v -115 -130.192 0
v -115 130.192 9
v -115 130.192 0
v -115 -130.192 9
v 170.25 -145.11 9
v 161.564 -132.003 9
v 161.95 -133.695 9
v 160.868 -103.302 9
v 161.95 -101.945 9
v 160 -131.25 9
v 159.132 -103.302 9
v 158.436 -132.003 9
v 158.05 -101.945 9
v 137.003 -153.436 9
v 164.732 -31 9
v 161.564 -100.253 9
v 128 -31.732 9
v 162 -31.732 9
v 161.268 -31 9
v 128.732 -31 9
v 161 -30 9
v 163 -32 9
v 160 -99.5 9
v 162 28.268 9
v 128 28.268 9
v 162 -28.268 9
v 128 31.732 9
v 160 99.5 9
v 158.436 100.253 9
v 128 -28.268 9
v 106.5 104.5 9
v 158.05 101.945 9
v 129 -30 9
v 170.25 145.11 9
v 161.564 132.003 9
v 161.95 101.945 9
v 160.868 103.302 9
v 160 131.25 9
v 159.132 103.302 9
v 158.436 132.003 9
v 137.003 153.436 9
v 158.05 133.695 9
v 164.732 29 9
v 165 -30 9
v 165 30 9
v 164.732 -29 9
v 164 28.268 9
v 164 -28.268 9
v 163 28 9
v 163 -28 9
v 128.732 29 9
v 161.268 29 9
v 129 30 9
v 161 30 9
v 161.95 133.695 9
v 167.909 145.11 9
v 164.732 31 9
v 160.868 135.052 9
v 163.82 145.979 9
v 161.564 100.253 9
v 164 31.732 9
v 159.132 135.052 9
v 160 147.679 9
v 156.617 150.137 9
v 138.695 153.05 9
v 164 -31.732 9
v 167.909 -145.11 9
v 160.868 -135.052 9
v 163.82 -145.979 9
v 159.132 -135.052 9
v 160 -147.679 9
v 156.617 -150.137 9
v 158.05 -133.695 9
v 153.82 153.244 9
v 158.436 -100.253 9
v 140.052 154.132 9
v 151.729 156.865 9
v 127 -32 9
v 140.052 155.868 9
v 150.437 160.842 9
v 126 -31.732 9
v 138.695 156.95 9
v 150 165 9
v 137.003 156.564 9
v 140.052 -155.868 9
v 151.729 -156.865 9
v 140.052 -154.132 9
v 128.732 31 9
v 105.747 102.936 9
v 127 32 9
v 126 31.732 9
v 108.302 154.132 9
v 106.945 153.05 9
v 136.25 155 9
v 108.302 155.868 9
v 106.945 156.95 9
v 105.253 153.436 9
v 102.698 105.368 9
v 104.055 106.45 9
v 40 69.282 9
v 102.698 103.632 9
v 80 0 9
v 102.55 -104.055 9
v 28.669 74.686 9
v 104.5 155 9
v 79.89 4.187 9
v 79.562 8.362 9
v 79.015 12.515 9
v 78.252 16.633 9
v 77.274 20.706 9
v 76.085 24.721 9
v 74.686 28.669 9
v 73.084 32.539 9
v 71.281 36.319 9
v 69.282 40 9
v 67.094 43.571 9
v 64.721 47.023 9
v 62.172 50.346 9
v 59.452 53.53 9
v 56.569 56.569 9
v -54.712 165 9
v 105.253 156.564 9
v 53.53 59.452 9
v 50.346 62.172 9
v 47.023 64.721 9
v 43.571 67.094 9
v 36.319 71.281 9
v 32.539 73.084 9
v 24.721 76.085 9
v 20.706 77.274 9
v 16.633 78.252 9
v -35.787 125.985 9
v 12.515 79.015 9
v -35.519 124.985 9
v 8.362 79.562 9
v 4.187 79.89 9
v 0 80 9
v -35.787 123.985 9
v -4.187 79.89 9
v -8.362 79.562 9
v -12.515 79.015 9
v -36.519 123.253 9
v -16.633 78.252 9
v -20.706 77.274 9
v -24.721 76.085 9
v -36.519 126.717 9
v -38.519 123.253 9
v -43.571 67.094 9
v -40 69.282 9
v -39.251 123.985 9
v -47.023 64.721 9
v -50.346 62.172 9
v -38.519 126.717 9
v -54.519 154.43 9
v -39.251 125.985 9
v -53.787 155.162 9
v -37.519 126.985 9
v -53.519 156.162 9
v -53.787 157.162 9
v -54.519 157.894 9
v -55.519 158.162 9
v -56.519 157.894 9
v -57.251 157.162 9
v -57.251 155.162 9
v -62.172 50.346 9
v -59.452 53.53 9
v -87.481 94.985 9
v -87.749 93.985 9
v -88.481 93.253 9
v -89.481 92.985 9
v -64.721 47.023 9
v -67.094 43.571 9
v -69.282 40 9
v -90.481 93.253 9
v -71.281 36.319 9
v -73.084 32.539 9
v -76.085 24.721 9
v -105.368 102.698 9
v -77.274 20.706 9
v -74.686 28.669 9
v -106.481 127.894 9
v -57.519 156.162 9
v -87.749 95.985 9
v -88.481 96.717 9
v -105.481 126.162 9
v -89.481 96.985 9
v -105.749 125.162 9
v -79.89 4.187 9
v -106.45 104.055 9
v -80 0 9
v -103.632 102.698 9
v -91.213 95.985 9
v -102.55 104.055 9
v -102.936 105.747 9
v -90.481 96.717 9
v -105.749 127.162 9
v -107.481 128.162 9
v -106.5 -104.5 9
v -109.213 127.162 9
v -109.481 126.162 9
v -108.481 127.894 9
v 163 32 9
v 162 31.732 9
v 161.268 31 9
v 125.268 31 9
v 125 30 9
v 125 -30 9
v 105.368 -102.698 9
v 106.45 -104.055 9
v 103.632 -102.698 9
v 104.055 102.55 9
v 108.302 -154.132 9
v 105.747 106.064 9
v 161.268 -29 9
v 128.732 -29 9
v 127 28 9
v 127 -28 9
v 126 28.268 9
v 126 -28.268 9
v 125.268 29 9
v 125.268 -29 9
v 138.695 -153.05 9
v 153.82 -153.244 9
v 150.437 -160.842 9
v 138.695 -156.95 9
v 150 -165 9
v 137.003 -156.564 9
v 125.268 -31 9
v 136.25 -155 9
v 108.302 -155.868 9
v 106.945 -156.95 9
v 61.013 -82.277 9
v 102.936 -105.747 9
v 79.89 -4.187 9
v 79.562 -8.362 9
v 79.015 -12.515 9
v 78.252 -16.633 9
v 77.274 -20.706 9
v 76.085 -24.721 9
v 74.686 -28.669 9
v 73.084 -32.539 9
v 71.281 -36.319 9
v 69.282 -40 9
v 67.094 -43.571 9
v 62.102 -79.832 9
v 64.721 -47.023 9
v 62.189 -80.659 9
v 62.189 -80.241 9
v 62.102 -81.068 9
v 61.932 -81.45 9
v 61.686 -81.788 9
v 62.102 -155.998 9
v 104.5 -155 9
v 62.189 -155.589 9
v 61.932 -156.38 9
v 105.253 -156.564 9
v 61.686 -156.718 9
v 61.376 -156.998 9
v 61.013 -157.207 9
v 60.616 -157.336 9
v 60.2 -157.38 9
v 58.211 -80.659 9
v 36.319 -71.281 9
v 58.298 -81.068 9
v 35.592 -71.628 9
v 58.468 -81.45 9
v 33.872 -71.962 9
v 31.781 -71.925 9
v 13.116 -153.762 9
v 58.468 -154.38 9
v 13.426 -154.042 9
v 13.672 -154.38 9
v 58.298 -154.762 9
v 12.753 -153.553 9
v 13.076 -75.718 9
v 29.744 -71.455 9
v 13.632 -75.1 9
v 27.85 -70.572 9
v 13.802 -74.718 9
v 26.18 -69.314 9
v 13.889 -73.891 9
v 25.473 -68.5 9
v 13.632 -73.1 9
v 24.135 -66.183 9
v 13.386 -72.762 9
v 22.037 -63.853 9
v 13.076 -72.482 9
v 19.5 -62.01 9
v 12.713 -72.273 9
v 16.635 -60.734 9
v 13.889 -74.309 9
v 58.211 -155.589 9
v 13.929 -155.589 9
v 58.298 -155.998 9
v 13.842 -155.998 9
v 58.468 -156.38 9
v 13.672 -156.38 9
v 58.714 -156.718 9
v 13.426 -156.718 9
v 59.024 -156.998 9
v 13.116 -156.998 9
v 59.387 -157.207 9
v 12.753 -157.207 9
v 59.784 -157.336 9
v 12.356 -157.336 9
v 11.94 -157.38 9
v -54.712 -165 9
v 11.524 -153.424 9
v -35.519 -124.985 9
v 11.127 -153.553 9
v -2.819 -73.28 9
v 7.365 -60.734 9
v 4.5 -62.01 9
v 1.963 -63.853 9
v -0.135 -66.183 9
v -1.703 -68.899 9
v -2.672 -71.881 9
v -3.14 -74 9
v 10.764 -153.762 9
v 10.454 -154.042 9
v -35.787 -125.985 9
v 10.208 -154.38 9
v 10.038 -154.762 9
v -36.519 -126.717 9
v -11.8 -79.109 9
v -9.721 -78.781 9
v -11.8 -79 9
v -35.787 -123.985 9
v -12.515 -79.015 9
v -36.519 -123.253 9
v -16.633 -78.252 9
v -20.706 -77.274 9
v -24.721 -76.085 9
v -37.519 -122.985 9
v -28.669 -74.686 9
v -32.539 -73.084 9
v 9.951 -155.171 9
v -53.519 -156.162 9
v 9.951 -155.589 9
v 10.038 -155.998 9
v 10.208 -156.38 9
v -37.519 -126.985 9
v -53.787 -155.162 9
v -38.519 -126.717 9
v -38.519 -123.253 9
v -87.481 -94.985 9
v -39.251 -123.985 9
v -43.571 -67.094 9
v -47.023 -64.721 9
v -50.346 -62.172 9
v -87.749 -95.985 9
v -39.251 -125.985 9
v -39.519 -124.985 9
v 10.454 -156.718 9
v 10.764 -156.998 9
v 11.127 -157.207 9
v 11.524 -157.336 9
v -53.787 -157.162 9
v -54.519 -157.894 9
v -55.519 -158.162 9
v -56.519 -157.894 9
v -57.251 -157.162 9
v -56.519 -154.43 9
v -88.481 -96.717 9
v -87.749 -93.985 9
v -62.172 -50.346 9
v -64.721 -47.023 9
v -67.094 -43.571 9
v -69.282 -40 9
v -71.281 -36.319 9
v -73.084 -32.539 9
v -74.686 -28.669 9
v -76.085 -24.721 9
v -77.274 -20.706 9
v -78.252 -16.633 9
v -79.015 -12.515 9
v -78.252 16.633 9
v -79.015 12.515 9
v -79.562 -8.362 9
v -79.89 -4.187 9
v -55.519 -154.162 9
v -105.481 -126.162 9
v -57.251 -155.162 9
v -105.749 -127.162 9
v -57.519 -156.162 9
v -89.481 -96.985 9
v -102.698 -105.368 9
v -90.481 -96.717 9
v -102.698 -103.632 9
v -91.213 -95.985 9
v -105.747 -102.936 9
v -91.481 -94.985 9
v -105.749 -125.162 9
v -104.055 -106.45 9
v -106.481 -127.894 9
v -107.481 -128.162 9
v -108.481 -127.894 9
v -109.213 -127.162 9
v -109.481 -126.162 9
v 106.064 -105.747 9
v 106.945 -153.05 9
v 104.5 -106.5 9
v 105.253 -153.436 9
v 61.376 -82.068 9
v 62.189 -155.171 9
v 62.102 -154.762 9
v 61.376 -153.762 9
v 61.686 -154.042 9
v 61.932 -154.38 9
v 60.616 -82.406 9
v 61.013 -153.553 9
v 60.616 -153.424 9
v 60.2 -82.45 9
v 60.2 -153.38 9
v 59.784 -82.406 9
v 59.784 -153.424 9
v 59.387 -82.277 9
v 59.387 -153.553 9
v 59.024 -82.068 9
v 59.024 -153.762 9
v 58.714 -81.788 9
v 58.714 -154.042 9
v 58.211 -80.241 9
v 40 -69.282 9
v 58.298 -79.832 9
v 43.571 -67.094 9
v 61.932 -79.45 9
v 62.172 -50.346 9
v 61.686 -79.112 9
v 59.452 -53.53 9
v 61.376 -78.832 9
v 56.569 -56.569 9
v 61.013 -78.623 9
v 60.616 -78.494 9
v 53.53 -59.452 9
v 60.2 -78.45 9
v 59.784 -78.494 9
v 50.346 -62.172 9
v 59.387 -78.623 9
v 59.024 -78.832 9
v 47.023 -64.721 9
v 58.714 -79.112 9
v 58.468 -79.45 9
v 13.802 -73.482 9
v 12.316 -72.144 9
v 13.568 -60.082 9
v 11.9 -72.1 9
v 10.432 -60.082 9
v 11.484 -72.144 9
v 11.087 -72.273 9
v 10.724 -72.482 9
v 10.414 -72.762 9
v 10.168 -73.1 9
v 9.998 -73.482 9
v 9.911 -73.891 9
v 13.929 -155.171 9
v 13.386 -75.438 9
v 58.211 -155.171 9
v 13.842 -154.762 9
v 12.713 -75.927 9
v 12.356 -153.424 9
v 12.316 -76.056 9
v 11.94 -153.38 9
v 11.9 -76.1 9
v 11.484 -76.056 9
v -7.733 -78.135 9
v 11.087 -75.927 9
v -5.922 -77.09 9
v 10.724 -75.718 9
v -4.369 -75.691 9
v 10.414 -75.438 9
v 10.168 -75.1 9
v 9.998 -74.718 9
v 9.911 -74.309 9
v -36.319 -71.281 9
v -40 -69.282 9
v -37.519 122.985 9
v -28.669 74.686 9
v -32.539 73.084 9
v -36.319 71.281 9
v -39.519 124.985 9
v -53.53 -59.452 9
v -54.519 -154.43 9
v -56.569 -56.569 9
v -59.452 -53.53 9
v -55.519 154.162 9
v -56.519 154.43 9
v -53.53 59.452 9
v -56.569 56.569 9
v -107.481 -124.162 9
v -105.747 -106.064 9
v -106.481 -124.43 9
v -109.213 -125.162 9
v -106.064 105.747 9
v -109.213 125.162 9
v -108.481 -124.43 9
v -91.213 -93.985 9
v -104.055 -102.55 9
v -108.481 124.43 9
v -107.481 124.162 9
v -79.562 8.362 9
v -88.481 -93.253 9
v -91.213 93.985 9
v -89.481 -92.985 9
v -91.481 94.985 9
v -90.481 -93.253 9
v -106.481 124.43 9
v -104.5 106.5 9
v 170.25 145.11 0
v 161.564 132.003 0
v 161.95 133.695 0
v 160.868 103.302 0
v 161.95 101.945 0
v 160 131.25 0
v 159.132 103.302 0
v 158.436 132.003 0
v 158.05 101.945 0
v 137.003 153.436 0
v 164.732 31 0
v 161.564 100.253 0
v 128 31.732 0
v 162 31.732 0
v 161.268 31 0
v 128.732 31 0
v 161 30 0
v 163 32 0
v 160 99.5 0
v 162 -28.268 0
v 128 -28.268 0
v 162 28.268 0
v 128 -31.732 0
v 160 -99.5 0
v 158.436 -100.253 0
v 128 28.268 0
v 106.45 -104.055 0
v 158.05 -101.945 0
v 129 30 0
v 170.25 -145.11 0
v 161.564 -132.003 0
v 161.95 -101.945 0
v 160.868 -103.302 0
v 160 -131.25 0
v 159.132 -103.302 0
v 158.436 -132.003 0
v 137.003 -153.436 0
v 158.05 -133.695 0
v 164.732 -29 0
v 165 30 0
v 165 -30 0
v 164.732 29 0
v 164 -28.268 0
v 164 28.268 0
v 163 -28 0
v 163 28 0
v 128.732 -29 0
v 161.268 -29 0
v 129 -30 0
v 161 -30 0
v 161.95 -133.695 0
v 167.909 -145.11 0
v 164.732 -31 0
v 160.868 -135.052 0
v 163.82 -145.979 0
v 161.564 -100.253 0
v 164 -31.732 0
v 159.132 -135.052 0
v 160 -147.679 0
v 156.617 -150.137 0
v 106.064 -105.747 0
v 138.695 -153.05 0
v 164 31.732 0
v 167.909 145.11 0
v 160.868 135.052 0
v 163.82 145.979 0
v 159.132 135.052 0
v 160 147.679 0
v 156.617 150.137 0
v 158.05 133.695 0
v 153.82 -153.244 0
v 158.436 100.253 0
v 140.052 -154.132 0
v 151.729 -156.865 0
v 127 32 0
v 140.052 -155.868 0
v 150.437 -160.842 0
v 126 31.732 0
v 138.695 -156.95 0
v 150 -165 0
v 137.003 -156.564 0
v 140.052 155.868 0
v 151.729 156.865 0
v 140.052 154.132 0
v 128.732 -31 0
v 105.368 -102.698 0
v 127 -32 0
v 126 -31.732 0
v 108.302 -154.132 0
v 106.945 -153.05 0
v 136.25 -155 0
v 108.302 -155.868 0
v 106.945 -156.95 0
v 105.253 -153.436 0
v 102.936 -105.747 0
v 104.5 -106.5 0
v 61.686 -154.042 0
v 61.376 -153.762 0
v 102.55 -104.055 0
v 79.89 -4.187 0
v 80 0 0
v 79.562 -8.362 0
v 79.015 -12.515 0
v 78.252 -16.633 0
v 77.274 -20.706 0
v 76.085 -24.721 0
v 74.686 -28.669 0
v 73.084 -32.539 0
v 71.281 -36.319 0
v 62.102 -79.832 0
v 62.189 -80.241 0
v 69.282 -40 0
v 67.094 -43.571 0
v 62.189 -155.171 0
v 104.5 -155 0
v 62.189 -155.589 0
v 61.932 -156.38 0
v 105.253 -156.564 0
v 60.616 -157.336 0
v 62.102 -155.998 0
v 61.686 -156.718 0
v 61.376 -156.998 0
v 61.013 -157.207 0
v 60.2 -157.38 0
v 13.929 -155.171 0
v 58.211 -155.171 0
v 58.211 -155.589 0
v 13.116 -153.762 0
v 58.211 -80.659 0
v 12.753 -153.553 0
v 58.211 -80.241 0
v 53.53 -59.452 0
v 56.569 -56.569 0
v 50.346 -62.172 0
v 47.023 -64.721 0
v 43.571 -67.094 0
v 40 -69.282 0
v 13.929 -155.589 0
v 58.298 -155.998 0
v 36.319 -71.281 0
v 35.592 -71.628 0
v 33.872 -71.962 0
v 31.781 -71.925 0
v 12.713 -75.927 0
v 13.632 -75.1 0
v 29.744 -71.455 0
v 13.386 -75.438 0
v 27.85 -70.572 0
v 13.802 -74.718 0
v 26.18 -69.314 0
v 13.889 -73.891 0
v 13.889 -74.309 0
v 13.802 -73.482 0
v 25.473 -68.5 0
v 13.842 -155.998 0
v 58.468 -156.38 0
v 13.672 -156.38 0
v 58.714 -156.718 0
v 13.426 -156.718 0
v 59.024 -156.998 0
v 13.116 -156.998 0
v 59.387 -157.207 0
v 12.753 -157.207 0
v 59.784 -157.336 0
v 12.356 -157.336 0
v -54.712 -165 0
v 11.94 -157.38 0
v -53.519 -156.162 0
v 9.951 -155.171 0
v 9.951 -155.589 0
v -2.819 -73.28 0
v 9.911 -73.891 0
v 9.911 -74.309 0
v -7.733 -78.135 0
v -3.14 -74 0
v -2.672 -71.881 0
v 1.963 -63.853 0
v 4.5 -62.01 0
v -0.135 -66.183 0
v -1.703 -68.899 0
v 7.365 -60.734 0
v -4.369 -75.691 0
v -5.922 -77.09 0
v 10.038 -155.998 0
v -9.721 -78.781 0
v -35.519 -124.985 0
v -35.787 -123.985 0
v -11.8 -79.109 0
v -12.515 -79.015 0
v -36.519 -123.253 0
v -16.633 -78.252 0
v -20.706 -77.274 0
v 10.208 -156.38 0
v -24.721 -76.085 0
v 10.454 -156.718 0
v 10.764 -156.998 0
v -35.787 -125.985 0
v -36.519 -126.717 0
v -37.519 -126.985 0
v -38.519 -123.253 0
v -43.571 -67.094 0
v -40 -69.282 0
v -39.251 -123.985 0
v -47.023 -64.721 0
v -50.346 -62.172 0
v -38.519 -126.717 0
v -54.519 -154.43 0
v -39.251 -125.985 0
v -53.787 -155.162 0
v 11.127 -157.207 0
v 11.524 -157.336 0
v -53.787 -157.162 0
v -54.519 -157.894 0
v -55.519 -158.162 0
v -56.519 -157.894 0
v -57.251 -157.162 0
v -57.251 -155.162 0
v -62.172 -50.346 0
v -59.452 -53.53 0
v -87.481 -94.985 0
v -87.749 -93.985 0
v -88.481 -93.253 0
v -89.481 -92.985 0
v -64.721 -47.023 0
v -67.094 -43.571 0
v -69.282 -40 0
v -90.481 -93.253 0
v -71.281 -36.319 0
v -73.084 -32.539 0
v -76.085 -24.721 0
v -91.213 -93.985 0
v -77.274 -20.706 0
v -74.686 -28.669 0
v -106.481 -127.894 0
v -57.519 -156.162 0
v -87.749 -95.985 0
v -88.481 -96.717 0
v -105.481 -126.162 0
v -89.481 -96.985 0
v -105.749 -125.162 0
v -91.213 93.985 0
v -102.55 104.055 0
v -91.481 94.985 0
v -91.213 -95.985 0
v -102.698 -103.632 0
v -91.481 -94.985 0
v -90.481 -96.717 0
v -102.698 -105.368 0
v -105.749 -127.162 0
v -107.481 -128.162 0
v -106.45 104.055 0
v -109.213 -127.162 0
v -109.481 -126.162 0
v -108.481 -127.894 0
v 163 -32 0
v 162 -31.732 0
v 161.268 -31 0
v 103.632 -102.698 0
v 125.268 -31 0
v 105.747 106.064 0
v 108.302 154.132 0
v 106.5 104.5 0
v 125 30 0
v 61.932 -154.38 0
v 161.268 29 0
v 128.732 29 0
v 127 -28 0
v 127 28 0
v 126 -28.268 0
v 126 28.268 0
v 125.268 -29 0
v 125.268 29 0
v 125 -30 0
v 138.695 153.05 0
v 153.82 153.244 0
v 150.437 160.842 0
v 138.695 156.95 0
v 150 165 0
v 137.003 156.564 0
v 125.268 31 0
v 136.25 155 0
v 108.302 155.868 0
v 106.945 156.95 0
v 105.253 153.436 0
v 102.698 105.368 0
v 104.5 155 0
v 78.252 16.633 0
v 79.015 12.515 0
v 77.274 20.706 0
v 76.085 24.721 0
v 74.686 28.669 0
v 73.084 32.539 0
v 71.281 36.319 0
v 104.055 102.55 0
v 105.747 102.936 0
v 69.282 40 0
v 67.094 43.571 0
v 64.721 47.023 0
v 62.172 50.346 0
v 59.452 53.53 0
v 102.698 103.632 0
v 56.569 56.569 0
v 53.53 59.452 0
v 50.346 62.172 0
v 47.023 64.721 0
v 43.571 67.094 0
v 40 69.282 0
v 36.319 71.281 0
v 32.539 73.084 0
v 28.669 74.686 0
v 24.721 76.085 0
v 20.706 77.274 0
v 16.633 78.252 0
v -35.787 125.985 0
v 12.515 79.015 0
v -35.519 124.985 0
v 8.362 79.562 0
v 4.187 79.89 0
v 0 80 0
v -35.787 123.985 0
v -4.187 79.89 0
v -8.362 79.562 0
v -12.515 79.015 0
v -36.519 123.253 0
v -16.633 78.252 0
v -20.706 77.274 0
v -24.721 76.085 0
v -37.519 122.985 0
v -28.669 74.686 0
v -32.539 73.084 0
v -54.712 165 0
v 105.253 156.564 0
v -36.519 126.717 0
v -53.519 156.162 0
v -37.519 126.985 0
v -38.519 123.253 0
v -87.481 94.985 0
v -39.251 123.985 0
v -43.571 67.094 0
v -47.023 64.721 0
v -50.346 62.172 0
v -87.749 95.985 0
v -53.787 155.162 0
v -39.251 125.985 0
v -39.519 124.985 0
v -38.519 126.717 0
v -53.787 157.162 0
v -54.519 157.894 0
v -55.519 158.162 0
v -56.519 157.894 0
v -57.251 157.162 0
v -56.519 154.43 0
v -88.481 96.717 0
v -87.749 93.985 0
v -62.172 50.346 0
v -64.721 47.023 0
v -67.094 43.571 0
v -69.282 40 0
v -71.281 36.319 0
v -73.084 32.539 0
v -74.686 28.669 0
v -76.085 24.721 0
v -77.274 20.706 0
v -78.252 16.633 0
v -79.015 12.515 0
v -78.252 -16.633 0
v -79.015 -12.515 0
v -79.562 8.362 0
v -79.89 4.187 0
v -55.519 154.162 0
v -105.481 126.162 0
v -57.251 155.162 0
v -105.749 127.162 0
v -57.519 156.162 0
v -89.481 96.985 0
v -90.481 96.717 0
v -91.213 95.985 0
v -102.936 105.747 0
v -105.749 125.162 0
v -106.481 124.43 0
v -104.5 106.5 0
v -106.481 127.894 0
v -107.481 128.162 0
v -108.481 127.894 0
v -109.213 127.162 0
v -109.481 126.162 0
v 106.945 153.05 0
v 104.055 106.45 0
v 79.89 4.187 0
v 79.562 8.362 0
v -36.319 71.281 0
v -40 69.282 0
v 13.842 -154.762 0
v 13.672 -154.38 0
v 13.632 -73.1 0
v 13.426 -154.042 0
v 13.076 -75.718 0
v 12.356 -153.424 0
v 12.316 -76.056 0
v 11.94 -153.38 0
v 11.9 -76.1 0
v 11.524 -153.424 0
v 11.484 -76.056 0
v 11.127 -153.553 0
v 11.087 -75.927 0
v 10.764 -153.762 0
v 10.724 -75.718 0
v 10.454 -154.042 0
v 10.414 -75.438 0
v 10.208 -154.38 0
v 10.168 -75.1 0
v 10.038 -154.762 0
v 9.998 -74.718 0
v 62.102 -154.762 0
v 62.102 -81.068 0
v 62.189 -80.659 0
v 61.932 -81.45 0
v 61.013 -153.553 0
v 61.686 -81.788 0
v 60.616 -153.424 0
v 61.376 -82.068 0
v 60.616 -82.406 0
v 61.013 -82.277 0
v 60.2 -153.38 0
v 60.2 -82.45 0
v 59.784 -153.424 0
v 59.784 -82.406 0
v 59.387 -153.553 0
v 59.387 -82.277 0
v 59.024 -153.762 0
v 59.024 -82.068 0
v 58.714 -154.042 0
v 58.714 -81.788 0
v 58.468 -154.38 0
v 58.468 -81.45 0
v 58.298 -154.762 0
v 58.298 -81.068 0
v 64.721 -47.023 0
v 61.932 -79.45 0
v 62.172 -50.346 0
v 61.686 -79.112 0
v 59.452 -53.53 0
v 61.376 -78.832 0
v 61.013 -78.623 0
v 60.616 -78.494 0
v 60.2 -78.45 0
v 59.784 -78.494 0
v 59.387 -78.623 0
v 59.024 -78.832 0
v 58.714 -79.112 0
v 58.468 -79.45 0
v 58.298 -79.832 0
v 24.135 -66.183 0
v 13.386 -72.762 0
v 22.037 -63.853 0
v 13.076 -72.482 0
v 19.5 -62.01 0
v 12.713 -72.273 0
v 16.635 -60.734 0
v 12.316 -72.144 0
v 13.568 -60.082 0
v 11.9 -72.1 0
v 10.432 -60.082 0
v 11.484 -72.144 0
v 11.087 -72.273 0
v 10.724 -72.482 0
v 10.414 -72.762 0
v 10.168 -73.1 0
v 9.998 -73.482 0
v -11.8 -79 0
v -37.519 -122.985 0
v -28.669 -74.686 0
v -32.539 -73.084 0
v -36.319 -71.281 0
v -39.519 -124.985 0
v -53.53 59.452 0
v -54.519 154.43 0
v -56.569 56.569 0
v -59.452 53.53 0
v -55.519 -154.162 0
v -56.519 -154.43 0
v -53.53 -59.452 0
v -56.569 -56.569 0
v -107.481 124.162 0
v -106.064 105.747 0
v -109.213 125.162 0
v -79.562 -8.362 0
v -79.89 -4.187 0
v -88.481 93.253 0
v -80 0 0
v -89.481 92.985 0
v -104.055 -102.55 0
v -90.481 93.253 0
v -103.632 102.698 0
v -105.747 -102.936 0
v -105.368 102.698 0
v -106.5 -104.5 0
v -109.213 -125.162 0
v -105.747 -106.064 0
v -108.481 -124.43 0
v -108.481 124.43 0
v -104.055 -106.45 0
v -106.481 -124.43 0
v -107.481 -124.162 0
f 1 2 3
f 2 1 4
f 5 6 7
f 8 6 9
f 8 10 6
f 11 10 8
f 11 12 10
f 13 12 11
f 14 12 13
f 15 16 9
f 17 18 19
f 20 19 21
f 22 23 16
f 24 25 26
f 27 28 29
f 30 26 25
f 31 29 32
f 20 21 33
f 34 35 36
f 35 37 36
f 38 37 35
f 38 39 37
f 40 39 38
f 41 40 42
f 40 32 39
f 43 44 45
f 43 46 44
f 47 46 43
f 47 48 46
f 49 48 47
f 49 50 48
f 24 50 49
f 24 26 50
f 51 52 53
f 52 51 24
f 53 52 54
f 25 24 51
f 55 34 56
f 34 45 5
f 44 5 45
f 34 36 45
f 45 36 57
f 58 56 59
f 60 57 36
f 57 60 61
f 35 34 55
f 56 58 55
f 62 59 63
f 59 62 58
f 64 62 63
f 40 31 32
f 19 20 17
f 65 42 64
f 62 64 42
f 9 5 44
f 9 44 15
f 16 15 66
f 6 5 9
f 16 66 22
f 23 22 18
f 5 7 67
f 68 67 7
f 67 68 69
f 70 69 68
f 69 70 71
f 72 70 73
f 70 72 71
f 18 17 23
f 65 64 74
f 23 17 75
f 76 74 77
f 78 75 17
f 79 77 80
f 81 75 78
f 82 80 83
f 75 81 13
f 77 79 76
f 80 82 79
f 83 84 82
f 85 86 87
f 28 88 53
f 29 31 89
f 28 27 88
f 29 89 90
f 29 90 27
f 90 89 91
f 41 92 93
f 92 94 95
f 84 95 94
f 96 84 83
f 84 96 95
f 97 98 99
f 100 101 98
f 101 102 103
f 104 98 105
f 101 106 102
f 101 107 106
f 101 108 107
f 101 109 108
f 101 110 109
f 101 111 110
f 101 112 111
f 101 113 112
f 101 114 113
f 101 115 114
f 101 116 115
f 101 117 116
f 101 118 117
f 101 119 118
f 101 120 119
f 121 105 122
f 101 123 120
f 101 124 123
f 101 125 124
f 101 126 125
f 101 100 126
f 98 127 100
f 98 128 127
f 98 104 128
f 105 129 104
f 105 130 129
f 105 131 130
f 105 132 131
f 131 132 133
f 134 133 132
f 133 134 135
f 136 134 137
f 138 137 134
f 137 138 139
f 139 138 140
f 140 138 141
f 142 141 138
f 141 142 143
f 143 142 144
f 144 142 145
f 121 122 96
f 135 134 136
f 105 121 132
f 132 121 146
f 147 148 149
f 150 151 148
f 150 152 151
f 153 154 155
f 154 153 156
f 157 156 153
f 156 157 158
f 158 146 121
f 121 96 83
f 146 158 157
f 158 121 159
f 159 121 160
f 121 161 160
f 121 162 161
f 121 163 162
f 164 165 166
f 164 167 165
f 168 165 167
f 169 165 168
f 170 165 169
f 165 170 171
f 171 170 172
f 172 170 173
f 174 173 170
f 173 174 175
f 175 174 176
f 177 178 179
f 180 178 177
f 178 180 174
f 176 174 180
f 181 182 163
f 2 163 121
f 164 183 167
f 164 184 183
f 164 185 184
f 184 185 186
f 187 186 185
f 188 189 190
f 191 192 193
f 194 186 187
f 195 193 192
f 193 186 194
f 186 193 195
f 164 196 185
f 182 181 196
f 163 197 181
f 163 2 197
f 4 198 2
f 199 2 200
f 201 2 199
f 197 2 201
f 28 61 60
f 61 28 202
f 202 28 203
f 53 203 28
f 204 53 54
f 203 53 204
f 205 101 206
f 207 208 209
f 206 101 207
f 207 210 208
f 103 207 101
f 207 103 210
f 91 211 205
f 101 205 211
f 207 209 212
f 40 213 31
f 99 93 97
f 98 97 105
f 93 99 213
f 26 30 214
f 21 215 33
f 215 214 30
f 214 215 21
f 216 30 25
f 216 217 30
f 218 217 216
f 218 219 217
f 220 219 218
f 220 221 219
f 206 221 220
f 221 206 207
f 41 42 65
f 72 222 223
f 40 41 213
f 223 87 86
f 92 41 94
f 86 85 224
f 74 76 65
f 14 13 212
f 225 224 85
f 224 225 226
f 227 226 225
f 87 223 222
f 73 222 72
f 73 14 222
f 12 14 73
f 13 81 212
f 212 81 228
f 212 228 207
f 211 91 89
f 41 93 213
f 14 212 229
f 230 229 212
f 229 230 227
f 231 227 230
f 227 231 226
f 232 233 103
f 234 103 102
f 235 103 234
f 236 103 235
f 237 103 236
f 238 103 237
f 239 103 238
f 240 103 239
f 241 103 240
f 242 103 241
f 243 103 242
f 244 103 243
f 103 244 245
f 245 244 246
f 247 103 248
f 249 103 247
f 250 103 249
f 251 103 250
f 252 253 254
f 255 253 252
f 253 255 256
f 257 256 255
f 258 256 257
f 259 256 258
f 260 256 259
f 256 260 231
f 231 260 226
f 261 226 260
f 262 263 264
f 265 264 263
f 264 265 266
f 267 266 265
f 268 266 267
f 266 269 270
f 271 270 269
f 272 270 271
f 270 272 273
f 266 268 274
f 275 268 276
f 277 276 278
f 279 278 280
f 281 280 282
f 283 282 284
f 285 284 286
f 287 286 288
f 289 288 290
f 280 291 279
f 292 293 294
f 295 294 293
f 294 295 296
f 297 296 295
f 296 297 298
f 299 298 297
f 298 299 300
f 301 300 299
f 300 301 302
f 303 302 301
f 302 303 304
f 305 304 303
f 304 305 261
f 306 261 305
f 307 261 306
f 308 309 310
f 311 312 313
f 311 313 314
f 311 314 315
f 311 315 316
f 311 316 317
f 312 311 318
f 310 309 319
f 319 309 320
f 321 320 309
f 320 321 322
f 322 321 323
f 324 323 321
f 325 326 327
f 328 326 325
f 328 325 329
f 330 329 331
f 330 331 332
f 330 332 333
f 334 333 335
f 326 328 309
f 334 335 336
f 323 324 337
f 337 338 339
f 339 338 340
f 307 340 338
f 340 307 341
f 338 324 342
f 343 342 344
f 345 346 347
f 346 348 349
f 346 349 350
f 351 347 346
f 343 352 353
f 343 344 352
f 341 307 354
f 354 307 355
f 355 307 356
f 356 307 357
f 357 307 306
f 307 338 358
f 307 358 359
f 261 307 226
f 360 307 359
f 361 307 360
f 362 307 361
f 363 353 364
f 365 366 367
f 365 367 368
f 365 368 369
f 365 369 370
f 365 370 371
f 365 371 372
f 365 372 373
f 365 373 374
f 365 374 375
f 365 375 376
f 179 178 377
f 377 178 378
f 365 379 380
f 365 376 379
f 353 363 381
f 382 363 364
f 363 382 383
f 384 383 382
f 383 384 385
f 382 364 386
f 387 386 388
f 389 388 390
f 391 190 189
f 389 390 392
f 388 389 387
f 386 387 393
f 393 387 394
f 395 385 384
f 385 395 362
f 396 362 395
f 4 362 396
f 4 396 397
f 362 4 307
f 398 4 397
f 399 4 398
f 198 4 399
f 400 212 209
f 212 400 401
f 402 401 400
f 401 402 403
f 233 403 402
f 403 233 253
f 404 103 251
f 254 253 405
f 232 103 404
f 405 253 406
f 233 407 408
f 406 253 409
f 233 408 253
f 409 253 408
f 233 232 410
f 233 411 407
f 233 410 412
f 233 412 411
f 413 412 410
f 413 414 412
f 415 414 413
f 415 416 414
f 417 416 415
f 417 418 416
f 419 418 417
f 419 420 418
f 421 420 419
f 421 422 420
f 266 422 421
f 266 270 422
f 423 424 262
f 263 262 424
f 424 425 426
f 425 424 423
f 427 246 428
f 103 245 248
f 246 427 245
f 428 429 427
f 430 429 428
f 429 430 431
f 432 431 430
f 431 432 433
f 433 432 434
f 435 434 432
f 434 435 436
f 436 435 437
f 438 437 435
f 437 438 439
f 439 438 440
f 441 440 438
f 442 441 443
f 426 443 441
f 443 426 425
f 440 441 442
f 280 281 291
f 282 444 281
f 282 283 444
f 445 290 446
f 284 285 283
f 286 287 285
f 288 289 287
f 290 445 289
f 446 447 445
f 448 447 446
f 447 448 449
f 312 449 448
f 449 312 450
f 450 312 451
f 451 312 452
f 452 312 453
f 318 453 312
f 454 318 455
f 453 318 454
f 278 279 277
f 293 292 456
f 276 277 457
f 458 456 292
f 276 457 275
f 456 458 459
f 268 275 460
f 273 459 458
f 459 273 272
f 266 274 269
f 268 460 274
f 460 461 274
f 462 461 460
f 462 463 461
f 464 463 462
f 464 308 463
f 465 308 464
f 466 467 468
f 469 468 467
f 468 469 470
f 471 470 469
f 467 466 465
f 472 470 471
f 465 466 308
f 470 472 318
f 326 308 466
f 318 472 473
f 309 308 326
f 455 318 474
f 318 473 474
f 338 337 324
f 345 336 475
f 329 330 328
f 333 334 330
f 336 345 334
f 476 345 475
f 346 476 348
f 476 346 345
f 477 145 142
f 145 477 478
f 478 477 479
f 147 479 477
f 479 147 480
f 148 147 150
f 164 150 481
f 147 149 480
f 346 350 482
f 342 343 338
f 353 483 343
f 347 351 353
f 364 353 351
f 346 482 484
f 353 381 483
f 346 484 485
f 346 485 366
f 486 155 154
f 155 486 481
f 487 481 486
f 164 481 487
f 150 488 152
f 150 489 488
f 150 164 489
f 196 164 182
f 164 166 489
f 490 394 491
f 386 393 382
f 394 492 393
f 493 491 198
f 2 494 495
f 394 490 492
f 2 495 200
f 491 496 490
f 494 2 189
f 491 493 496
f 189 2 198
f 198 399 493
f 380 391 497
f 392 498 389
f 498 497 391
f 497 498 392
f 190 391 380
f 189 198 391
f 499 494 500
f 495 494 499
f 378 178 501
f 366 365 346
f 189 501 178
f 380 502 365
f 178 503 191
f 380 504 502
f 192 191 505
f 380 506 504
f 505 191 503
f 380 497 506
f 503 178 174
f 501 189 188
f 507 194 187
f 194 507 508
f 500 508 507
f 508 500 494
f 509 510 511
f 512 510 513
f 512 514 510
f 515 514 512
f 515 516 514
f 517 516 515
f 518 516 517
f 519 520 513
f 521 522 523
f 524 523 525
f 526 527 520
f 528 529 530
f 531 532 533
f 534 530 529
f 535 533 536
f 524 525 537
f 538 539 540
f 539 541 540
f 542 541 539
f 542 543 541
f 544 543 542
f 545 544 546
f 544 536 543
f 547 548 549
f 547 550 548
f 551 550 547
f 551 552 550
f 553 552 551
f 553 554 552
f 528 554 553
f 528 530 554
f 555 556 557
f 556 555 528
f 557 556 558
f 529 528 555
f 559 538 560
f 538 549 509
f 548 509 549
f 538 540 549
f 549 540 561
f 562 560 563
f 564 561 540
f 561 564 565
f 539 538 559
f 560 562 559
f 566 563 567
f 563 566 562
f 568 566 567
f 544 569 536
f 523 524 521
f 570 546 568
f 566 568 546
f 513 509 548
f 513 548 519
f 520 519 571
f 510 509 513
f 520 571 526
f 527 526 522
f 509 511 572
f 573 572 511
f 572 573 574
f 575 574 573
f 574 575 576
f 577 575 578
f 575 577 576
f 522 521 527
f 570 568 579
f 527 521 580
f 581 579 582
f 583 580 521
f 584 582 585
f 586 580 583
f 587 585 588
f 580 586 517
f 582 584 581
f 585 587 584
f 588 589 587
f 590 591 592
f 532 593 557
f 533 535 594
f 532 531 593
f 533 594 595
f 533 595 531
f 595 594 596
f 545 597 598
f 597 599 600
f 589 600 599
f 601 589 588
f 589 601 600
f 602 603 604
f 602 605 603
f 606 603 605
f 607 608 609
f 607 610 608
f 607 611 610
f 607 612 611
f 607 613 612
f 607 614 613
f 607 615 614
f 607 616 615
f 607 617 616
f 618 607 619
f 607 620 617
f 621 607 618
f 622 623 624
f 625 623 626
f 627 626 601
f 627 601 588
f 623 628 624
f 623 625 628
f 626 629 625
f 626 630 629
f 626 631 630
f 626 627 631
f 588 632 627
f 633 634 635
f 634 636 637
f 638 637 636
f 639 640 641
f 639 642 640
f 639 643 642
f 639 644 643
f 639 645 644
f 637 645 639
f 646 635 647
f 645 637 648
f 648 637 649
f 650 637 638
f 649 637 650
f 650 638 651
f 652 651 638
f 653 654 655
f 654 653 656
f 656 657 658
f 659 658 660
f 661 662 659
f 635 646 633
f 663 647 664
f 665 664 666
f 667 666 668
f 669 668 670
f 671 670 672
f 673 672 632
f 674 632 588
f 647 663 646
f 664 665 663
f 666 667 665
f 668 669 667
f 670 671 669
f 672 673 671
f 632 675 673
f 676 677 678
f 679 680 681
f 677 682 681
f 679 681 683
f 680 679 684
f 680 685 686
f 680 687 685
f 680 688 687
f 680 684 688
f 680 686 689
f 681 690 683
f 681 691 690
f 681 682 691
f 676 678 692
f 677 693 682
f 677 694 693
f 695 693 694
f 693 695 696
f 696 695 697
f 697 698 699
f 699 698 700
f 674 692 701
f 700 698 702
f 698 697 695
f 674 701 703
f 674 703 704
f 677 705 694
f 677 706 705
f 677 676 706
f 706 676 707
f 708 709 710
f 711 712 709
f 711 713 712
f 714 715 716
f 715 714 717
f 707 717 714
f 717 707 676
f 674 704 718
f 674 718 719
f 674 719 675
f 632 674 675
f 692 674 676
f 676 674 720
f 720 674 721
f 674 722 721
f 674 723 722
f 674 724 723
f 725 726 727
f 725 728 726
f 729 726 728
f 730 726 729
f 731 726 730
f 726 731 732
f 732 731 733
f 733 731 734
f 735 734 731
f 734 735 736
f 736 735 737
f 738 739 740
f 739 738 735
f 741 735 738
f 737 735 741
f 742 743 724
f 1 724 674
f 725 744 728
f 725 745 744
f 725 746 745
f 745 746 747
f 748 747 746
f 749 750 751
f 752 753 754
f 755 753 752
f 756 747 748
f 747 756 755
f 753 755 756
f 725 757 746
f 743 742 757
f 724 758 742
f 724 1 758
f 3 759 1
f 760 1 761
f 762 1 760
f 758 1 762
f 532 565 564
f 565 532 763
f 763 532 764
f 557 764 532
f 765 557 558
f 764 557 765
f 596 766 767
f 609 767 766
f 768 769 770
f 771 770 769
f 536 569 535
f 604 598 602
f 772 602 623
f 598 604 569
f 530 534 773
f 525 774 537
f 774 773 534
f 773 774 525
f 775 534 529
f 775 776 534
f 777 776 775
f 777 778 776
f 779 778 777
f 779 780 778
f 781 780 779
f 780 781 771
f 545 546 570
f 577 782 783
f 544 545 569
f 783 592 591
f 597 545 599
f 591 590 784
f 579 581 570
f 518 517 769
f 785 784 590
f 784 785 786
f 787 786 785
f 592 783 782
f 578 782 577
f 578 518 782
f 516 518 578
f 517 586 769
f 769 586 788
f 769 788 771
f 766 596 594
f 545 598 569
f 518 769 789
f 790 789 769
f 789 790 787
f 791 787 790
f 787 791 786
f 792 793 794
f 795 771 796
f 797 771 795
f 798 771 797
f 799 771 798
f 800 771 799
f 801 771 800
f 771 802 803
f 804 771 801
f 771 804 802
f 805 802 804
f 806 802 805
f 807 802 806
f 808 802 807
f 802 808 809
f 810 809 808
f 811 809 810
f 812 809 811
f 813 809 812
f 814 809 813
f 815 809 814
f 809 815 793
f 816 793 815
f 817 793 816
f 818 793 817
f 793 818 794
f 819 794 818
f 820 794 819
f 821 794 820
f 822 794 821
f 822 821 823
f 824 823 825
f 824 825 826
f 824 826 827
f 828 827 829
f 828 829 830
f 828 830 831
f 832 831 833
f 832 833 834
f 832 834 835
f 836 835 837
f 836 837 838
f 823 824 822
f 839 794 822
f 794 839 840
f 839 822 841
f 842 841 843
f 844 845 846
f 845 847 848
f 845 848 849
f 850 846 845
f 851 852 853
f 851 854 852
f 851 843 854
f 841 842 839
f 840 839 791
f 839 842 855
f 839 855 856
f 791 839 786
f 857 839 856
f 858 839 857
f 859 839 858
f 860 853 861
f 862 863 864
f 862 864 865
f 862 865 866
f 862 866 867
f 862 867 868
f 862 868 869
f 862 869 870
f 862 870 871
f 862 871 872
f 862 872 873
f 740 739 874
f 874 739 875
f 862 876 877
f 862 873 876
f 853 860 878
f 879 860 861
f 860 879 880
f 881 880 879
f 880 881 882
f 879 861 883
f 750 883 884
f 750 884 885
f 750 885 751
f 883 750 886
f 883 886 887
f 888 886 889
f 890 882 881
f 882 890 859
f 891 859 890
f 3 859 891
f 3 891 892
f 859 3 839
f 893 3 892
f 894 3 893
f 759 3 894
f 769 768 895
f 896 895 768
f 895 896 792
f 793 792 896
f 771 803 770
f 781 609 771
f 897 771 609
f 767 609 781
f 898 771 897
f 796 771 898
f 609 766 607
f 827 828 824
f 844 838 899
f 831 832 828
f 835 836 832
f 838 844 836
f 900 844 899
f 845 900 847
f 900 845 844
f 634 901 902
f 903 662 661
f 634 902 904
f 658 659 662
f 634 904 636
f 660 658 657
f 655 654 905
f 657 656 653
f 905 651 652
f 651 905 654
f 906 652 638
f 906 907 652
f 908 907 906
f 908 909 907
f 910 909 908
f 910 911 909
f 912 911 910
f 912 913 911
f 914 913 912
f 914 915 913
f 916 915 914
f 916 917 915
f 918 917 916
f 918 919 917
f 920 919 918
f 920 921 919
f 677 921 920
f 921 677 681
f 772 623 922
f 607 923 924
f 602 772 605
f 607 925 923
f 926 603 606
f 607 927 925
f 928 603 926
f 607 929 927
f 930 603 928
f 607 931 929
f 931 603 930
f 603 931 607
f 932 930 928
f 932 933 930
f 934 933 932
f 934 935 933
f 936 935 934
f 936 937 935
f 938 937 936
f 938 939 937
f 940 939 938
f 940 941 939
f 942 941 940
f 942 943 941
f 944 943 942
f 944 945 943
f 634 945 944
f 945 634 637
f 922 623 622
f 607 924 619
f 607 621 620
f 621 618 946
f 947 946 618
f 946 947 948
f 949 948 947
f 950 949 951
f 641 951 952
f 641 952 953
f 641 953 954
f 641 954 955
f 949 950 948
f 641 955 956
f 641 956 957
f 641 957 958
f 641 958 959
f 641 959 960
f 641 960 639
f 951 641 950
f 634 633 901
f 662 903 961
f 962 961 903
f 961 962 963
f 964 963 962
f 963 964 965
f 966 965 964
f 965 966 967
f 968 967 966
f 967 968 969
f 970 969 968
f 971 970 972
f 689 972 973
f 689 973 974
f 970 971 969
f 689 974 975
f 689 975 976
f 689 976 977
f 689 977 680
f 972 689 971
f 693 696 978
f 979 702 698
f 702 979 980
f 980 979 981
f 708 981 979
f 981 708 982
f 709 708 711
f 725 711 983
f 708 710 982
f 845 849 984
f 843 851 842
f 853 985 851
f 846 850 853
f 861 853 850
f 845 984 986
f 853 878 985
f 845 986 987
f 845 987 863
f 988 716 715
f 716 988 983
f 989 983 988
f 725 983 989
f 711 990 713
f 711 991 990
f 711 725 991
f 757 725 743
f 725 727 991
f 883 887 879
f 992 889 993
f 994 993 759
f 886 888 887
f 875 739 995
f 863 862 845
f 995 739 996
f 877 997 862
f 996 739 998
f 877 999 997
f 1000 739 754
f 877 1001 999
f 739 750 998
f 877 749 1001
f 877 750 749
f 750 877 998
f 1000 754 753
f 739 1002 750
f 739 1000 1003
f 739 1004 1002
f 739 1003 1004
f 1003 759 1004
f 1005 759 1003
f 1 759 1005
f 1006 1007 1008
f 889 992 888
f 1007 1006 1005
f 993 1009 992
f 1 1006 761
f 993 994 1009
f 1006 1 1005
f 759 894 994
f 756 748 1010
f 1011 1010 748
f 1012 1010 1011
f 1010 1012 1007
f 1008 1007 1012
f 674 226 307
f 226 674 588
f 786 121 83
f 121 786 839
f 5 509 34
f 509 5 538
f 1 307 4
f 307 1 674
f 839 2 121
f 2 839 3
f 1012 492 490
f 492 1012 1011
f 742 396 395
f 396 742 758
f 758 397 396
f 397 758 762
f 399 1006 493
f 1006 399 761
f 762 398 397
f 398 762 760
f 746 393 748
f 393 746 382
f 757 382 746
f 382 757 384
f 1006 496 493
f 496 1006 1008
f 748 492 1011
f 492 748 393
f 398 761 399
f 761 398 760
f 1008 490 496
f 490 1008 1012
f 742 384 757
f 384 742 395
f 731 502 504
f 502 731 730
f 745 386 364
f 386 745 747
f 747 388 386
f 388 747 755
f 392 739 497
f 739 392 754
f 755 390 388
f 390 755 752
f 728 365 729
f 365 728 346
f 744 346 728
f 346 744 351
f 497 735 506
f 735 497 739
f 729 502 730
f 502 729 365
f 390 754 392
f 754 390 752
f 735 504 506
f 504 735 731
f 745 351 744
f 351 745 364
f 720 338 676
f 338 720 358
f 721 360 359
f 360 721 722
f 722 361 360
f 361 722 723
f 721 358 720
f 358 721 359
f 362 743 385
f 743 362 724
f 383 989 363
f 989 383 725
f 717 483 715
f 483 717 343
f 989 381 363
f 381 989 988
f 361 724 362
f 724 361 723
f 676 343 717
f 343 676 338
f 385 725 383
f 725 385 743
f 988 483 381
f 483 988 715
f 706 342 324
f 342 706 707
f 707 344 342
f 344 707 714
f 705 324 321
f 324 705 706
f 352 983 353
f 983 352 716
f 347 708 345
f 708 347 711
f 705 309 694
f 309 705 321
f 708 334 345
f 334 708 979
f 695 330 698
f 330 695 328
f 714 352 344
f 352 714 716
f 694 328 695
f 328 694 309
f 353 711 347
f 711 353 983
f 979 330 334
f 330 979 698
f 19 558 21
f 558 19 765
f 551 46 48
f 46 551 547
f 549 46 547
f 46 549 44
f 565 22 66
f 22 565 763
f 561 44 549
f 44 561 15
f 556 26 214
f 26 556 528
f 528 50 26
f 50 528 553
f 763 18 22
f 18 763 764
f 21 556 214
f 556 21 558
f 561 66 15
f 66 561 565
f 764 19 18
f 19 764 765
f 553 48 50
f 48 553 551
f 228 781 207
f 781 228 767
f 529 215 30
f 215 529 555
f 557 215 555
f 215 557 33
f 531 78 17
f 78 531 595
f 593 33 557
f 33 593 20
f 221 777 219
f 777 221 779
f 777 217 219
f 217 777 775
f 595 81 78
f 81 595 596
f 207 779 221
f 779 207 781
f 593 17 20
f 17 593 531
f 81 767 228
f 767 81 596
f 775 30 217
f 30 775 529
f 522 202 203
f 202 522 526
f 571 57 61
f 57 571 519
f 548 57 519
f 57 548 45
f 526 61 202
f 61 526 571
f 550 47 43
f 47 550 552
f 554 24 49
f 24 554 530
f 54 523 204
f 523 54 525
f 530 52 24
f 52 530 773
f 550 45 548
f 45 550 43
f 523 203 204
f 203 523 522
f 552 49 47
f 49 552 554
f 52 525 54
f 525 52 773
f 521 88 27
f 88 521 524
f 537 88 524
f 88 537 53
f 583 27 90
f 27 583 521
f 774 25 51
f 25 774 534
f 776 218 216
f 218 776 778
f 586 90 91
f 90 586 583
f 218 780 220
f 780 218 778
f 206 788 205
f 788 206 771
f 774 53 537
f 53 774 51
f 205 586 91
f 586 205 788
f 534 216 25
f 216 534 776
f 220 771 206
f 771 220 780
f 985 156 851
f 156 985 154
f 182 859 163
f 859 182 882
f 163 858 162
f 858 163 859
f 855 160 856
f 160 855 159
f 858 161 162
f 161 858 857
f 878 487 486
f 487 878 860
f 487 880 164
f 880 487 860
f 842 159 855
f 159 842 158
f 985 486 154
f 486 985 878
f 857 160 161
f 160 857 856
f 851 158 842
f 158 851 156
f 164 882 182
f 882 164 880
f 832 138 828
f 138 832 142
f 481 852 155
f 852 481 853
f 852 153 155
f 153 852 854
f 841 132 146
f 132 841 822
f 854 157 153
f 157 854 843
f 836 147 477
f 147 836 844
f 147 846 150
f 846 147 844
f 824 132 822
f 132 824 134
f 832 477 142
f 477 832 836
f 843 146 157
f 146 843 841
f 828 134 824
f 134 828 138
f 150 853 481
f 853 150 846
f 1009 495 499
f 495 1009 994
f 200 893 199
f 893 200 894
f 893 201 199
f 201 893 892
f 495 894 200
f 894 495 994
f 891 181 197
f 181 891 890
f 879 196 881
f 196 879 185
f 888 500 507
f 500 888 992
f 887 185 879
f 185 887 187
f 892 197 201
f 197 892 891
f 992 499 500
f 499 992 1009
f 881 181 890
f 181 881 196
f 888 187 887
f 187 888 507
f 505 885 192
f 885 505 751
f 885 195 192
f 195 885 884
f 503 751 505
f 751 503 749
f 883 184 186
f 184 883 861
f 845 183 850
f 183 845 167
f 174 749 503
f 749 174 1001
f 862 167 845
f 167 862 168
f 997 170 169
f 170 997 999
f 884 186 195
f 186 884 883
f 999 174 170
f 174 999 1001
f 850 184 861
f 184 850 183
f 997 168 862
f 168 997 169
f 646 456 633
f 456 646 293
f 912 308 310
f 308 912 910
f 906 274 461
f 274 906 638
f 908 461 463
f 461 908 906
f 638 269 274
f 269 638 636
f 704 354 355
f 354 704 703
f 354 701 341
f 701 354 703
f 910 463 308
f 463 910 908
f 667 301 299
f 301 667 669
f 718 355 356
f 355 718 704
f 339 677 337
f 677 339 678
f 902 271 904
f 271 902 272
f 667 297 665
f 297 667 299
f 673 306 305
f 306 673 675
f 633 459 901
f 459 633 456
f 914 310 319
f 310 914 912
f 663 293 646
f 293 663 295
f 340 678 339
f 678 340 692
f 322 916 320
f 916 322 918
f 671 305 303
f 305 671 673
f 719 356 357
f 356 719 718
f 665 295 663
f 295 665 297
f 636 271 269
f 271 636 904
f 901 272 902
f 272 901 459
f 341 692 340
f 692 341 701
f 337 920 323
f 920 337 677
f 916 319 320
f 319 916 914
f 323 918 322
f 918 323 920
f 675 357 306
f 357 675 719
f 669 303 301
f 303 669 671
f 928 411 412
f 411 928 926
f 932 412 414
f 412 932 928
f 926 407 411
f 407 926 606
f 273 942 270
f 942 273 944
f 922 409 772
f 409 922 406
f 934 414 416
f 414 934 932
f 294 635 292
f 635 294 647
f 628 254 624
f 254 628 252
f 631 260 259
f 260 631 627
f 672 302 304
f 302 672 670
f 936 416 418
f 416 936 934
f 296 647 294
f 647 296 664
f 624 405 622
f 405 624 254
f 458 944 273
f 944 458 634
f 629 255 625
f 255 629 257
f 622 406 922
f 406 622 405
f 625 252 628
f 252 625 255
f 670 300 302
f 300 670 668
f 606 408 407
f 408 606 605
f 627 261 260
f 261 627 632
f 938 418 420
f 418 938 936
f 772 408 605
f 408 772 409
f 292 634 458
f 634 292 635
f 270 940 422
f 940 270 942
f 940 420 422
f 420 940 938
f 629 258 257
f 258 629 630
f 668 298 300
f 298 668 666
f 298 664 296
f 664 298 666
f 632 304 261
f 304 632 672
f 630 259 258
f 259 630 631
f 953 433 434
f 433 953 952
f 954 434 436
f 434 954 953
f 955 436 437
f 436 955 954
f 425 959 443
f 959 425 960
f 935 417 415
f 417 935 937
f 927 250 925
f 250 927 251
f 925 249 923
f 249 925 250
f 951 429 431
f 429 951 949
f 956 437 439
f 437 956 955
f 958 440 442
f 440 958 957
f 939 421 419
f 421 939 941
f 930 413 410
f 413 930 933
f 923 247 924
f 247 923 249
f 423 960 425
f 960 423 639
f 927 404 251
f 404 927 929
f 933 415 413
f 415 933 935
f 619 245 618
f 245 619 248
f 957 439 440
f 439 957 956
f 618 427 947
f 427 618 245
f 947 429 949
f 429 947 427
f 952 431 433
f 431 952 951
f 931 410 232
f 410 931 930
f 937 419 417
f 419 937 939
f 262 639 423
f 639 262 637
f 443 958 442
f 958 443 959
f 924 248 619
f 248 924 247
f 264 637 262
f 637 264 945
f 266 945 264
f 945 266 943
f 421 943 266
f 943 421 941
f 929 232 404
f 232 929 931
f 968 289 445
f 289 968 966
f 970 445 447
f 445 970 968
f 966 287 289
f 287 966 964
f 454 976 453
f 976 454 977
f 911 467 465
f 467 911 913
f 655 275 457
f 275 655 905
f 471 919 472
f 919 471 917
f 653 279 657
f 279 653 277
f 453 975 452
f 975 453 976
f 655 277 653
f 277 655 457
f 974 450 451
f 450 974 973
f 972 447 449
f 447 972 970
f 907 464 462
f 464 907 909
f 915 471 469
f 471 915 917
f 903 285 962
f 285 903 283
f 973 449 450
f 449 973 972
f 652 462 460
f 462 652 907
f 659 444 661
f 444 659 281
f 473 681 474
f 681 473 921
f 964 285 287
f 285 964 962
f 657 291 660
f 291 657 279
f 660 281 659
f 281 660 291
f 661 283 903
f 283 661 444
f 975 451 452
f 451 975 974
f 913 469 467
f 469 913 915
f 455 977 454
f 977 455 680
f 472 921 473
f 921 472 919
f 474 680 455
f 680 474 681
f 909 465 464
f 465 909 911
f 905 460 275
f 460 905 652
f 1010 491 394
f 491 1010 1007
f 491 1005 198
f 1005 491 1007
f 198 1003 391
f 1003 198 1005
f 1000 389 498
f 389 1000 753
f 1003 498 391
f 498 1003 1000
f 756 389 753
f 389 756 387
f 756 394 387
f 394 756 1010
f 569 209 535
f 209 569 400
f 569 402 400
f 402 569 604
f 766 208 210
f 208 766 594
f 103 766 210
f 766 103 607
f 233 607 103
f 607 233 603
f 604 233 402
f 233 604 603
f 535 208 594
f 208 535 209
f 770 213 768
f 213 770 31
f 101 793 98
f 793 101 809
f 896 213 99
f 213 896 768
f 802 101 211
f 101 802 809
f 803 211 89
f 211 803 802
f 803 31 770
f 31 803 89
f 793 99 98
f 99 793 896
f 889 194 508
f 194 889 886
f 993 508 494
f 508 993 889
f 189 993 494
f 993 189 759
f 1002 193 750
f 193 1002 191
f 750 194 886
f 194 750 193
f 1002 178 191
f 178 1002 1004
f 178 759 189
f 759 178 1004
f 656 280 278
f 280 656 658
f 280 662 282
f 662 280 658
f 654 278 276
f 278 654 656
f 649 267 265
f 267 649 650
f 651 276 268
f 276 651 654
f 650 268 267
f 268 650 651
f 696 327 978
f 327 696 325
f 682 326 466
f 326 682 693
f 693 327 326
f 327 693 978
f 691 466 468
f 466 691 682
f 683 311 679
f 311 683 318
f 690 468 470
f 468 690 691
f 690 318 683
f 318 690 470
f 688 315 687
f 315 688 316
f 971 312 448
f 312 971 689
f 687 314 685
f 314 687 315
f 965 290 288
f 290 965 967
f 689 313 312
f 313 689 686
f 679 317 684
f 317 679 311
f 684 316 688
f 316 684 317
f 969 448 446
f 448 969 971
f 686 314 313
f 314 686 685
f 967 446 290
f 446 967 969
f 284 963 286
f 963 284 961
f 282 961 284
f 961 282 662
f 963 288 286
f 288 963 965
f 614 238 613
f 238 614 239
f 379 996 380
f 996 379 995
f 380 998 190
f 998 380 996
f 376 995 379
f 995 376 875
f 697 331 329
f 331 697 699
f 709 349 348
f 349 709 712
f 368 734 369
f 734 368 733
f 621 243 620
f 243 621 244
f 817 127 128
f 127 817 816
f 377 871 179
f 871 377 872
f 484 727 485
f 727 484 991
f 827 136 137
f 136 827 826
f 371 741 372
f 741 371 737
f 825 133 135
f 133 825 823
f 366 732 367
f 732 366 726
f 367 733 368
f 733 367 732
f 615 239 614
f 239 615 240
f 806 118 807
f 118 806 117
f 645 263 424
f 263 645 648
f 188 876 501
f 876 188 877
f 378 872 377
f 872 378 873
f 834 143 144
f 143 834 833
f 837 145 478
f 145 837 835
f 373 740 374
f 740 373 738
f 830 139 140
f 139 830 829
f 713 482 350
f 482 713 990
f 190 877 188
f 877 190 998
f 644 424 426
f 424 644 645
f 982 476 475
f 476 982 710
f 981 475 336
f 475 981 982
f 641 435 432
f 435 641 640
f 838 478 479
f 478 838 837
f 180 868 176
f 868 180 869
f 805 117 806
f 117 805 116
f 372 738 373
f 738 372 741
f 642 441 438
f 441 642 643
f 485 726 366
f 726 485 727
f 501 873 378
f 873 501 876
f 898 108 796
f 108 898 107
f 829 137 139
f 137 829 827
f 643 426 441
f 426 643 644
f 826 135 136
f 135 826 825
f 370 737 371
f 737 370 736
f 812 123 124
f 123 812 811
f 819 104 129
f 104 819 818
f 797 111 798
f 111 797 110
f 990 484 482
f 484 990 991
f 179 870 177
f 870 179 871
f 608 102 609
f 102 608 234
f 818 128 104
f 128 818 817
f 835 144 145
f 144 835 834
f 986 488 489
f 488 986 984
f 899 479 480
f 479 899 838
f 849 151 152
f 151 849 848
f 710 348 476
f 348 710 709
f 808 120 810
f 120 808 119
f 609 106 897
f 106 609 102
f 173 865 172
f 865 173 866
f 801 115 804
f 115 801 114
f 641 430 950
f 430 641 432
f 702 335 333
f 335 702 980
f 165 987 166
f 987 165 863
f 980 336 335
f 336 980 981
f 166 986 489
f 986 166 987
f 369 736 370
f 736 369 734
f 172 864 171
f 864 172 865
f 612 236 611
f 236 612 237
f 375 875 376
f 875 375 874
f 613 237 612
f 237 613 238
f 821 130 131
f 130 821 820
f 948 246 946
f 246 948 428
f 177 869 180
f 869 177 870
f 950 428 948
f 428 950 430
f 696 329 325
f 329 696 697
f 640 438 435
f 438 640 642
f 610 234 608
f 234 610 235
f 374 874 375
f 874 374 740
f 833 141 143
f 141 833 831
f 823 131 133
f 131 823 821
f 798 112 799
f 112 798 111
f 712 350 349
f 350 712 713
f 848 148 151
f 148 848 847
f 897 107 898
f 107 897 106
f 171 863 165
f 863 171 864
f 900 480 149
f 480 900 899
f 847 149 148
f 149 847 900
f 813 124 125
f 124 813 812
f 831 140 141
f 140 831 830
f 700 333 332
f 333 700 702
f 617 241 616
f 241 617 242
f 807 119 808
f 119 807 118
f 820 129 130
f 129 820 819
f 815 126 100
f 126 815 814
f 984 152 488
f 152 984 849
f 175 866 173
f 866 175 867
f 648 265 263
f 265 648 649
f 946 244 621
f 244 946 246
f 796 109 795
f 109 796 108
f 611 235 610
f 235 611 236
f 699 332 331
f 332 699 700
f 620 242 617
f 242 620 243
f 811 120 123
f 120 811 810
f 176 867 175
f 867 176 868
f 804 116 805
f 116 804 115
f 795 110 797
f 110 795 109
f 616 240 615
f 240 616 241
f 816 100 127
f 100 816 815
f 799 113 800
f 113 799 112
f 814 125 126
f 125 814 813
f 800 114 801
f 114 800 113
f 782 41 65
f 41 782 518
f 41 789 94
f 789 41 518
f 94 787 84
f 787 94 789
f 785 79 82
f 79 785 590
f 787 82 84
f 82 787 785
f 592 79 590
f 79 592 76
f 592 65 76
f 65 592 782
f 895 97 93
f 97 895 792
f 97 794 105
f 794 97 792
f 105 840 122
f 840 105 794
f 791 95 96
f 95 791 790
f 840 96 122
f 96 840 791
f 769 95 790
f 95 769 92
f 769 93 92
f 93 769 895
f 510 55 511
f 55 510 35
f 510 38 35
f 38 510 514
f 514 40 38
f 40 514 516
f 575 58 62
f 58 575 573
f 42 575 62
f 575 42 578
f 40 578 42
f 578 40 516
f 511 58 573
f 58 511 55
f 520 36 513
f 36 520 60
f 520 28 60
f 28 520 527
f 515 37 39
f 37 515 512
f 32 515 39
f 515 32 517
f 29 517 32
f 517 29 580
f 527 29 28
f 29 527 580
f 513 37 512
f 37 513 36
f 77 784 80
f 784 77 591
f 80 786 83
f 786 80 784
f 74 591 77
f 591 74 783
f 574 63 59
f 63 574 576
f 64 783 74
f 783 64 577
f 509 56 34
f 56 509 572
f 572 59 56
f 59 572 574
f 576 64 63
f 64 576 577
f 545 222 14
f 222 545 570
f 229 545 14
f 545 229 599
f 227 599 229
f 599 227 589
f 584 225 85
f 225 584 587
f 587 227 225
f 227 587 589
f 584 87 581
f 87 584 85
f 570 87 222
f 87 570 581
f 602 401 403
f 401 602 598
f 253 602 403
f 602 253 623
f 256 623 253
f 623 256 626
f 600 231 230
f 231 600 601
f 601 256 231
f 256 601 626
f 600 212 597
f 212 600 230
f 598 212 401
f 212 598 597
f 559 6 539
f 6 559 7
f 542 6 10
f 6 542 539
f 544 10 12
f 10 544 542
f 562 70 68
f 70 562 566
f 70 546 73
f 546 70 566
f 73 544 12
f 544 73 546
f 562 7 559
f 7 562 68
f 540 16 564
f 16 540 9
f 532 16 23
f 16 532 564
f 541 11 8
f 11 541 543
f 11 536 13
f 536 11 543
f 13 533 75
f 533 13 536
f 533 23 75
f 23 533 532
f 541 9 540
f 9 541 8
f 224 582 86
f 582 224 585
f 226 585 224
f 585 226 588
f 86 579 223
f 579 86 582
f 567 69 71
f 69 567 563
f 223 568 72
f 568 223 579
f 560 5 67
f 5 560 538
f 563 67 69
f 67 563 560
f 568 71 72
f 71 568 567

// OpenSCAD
/* 
------------------------------------------------------------------------------------------------------------
This has been designed by JOHN KRACZEK, 
the idea for this loosely came from http://www.thingiverse.com/thing:31593 by RustyPaint
i liked his idea but didnt feel that it had the right dimentions for my application. 

i wanted to make sure that everything was as close to correct as possible, so i imported the Motor_End.STL file 
to help facilitate accurate Design. you can see this by turning Generate_Externals to true, 
(you will have to get that file from the Rostock Thing http://www.thingiverse.com/thing:17175)


Feel Free to modify for your application and please let me know if you find any bugs or defects in this design. 

------------------------------------------------------------------------------------------------------------

To generate an DXF so that you can send it to the laser i followed this process: 

1. Generate the Part the way that you would like to see it. 
	adjust the holes and the other parts to your likeing. 

2. Set Generate_DXF to true and then Compile using CGAL (F6) 
	This took a while for me, but i have a slower computer

3. Export to DXF

------------------------------------------------------------------------------------------------------------

*/


Generate_DXF = false; 				// if you want to export DXF set to true (May Take a while to compile, just be patient)
Generate_Externals = false; 		// Externals like the motor_end.stl just gives a visual confirmation that everything has been drawn accurately. 

Generate_Bottom = true;  			// if true then OpenSCAD will generate the bottom acrylic, if false will generate the Top acrylic piece. 
Generate_Bracket = false;

Smooth_Rod_Offset = 175; 			// This is the Distance from the center to the smooth rods. 
// (this is just for refrence if you change this then you will want to change lots of things down below)

height=9;							// The Height of the 3D Model
in = 25.4;							// Generic variable converting metric to inches IE. 4*in = 101.6 mm
Electronics_Holes = 0;				// if you want the holes on the left type 180 on right type 0;




module Rostock_Base(){
	difference(){
		intersection(){
			translate([-175,-165,0])
			cube([290,330,height]);
			translate([0,0,-2])
			//This is the Triangle for the 3 sides 
			cylinder(r=Smooth_Rod_Offset*2-9.5,h=height+5, $fn=3);
		}

		//Motor Mount Holes
		union(){
			translate([0,0,-5])
			for(i=[0:2]){
				rotate([0,0,60])
				rotate([0,0,120*i])
				translate([175-12,0,0]){
					for(x=[-30,30]){
						translate([0,x,0])
						//holes near smooth Rod
						cylinder(r=2,h=height*5+1, $fn=12);
						if(Generate_Bottom){
							translate([-36,x,0])
							cylinder(r=2,h=height*3+1, $fn=12);
						}
					}
				}
			}
		}
		
		// Generate Electronics Holes
		if(Generate_Bottom){
			
			rotate([Electronics_Holes,0,0])
			translate([-111+4*in,170])
			rotate([180,0,-90]){

				translate([14.62,2.54,-20])
				cylinder(r=2, h=height*4, $fn=30);
				translate([14.62,50.8,-20])
				cylinder(r=2, h=height*4, $fn=30);
				translate([89.55,50.8,-20])
				cylinder(r=2, h=height*4, $fn=30);
				translate([95.9,2.5,-20])
				cylinder(r=2, h=height*4, $fn=30);
			}
		}
		// PCB Heated Bed Holes
		if(Generate_Bottom){
			
			union(){
				for(i=[0:3]){
					rotate([0,0,90*i])
					translate([209/2,209/2,-5])
					cylinder(r=2,h=20);
				}
			}
		}
		
		//Hole Through Center
		translate([0,0,-20])
		if(Generate_Bottom){
			difference(){
				cylinder(r=80,h=50, $fn=120);
				rotate([Electronics_Holes,0,0]){
					translate([-12,75,-50])
					cylinder(r=15,h=100,$fn=30);
					
					translate([-33,62,-30]){
						rotate([0,0,35])
						difference(){
							cube([25,25,100]);
							cylinder(r=10,h=100,$fn=30);
						}
					}
					translate([11.8,69,-30]){
						rotate([0,0,90])
						difference(){
							translate([2,0,0])
							cube([12,25,100]);
							cylinder(r=10,h=100,$fn=30);
						}
					}
				}
			}
			
		} else {
			difference(){
				cylinder(r=130,h=50, $fn=120);
				translate([75,-200,5])
				cube([40,400,30]);
			}
		}
		
		//Wall Support Holes
		for(i=[0,180]){
			rotate([i,0,0])
			translate([-170,-165,-20]){

				for(a=[1:2]){
					translate([1.25*in*a,10,9])
					cylinder(r=2,h=25);
				}
				for(a=[1:2]){
					rotate([0,0,90])
					translate([1.25*in*a,-10,9])
					cylinder(r=2,h=25);
				}
				//Corner Holes
				if(Generate_Bottom){
					cylinder(r=20,h=45);
				}
			}
		}		
	}
}

module Wall_Support_Bracket(){
	difference(){
		#cube([3*in,3*in,height]);
		//Support Holes
		for(a=[1:2]){
			translate([1.25*in*a,10,-1])
			#cylinder(r=2,h=25, $fn = 12);
		}
		for(a=[1:2]){
			rotate([0,0,90])
			translate([1.25*in*a,-10,-1])
			#cylinder(r=2,h=25 , $fn=12);
		}
		//Corner Hole
		if(Generate_Bottom){
			translate([0,0,-1])
			cylinder(r=20,h=45);
		}
		
		//everything else
		translate([24.5,44,-1])
		cube([2.25*in,1.5*in,height+2]);
		translate([44,24.5,-1])
		cube([1.5*in,2.25*in,height+2]);
		translate([1.75*in,1.75*in,-1])
		cylinder(r=20,h=height+2);
		
		

			for (c=[[0,0,0],[180,0,90]])
			rotate(c){
			difference(){
			translate([-1,3*in-20,-height-1])
			#cube([26,40,height*2+2]);
			translate([5,3*in-20,-height-1])
			#cylinder(r=20,h=height*2+2);
			}
		}
	}
}


module Externals(){

	//Place for the Smooth Rods
	//translate([0,0,-10])
	//cylinder(r=175*2,h=height+1, $fn=3);
	for(i=[0:2]){
		color("red")
		rotate([0,0,120*i+60]){
			cube([Smooth_Rod_Offset,5,20]);
			rotate([0,0,60])
			translate([-175,0,0])
			rotate([0,0,270])
			import("motor_end.stl");
		}

	}
	
	//Motor Mount Holes
	translate([0,0,-5])
	for(i=[0:2]){
		rotate([0,0,60])
		rotate([0,0,120*i])
		translate([175-12,0,0]){
			for(x=[-30,30]){
				translate([0,x,0])
				//holes near smooth Rod
				cylinder(r=2,h=height*5+1, $fn=12);
				if(Generate_bottom){
					translate([-36,x,0])
					cylinder(r=2,h=height*3+1, $fn=12);
				}
			}
		}
	}	
	
}



// Generate either a 3d object or a 2d projection based on the variable Generate_DXF
rotate([0,0,180])
if(Generate_DXF){

	projection(cut = false) {
		translate([0,0,-5])
		
		if(Generate_Bracket){
			Wall_Support_Bracket();
		}else{
			Rostock_Base();
		}
	}
} else {
	if(Generate_Bracket){
		Wall_Support_Bracket();
	}else{
		Rostock_Base();
		if(Generate_Externals){
			Externals();
		}
	}
}
